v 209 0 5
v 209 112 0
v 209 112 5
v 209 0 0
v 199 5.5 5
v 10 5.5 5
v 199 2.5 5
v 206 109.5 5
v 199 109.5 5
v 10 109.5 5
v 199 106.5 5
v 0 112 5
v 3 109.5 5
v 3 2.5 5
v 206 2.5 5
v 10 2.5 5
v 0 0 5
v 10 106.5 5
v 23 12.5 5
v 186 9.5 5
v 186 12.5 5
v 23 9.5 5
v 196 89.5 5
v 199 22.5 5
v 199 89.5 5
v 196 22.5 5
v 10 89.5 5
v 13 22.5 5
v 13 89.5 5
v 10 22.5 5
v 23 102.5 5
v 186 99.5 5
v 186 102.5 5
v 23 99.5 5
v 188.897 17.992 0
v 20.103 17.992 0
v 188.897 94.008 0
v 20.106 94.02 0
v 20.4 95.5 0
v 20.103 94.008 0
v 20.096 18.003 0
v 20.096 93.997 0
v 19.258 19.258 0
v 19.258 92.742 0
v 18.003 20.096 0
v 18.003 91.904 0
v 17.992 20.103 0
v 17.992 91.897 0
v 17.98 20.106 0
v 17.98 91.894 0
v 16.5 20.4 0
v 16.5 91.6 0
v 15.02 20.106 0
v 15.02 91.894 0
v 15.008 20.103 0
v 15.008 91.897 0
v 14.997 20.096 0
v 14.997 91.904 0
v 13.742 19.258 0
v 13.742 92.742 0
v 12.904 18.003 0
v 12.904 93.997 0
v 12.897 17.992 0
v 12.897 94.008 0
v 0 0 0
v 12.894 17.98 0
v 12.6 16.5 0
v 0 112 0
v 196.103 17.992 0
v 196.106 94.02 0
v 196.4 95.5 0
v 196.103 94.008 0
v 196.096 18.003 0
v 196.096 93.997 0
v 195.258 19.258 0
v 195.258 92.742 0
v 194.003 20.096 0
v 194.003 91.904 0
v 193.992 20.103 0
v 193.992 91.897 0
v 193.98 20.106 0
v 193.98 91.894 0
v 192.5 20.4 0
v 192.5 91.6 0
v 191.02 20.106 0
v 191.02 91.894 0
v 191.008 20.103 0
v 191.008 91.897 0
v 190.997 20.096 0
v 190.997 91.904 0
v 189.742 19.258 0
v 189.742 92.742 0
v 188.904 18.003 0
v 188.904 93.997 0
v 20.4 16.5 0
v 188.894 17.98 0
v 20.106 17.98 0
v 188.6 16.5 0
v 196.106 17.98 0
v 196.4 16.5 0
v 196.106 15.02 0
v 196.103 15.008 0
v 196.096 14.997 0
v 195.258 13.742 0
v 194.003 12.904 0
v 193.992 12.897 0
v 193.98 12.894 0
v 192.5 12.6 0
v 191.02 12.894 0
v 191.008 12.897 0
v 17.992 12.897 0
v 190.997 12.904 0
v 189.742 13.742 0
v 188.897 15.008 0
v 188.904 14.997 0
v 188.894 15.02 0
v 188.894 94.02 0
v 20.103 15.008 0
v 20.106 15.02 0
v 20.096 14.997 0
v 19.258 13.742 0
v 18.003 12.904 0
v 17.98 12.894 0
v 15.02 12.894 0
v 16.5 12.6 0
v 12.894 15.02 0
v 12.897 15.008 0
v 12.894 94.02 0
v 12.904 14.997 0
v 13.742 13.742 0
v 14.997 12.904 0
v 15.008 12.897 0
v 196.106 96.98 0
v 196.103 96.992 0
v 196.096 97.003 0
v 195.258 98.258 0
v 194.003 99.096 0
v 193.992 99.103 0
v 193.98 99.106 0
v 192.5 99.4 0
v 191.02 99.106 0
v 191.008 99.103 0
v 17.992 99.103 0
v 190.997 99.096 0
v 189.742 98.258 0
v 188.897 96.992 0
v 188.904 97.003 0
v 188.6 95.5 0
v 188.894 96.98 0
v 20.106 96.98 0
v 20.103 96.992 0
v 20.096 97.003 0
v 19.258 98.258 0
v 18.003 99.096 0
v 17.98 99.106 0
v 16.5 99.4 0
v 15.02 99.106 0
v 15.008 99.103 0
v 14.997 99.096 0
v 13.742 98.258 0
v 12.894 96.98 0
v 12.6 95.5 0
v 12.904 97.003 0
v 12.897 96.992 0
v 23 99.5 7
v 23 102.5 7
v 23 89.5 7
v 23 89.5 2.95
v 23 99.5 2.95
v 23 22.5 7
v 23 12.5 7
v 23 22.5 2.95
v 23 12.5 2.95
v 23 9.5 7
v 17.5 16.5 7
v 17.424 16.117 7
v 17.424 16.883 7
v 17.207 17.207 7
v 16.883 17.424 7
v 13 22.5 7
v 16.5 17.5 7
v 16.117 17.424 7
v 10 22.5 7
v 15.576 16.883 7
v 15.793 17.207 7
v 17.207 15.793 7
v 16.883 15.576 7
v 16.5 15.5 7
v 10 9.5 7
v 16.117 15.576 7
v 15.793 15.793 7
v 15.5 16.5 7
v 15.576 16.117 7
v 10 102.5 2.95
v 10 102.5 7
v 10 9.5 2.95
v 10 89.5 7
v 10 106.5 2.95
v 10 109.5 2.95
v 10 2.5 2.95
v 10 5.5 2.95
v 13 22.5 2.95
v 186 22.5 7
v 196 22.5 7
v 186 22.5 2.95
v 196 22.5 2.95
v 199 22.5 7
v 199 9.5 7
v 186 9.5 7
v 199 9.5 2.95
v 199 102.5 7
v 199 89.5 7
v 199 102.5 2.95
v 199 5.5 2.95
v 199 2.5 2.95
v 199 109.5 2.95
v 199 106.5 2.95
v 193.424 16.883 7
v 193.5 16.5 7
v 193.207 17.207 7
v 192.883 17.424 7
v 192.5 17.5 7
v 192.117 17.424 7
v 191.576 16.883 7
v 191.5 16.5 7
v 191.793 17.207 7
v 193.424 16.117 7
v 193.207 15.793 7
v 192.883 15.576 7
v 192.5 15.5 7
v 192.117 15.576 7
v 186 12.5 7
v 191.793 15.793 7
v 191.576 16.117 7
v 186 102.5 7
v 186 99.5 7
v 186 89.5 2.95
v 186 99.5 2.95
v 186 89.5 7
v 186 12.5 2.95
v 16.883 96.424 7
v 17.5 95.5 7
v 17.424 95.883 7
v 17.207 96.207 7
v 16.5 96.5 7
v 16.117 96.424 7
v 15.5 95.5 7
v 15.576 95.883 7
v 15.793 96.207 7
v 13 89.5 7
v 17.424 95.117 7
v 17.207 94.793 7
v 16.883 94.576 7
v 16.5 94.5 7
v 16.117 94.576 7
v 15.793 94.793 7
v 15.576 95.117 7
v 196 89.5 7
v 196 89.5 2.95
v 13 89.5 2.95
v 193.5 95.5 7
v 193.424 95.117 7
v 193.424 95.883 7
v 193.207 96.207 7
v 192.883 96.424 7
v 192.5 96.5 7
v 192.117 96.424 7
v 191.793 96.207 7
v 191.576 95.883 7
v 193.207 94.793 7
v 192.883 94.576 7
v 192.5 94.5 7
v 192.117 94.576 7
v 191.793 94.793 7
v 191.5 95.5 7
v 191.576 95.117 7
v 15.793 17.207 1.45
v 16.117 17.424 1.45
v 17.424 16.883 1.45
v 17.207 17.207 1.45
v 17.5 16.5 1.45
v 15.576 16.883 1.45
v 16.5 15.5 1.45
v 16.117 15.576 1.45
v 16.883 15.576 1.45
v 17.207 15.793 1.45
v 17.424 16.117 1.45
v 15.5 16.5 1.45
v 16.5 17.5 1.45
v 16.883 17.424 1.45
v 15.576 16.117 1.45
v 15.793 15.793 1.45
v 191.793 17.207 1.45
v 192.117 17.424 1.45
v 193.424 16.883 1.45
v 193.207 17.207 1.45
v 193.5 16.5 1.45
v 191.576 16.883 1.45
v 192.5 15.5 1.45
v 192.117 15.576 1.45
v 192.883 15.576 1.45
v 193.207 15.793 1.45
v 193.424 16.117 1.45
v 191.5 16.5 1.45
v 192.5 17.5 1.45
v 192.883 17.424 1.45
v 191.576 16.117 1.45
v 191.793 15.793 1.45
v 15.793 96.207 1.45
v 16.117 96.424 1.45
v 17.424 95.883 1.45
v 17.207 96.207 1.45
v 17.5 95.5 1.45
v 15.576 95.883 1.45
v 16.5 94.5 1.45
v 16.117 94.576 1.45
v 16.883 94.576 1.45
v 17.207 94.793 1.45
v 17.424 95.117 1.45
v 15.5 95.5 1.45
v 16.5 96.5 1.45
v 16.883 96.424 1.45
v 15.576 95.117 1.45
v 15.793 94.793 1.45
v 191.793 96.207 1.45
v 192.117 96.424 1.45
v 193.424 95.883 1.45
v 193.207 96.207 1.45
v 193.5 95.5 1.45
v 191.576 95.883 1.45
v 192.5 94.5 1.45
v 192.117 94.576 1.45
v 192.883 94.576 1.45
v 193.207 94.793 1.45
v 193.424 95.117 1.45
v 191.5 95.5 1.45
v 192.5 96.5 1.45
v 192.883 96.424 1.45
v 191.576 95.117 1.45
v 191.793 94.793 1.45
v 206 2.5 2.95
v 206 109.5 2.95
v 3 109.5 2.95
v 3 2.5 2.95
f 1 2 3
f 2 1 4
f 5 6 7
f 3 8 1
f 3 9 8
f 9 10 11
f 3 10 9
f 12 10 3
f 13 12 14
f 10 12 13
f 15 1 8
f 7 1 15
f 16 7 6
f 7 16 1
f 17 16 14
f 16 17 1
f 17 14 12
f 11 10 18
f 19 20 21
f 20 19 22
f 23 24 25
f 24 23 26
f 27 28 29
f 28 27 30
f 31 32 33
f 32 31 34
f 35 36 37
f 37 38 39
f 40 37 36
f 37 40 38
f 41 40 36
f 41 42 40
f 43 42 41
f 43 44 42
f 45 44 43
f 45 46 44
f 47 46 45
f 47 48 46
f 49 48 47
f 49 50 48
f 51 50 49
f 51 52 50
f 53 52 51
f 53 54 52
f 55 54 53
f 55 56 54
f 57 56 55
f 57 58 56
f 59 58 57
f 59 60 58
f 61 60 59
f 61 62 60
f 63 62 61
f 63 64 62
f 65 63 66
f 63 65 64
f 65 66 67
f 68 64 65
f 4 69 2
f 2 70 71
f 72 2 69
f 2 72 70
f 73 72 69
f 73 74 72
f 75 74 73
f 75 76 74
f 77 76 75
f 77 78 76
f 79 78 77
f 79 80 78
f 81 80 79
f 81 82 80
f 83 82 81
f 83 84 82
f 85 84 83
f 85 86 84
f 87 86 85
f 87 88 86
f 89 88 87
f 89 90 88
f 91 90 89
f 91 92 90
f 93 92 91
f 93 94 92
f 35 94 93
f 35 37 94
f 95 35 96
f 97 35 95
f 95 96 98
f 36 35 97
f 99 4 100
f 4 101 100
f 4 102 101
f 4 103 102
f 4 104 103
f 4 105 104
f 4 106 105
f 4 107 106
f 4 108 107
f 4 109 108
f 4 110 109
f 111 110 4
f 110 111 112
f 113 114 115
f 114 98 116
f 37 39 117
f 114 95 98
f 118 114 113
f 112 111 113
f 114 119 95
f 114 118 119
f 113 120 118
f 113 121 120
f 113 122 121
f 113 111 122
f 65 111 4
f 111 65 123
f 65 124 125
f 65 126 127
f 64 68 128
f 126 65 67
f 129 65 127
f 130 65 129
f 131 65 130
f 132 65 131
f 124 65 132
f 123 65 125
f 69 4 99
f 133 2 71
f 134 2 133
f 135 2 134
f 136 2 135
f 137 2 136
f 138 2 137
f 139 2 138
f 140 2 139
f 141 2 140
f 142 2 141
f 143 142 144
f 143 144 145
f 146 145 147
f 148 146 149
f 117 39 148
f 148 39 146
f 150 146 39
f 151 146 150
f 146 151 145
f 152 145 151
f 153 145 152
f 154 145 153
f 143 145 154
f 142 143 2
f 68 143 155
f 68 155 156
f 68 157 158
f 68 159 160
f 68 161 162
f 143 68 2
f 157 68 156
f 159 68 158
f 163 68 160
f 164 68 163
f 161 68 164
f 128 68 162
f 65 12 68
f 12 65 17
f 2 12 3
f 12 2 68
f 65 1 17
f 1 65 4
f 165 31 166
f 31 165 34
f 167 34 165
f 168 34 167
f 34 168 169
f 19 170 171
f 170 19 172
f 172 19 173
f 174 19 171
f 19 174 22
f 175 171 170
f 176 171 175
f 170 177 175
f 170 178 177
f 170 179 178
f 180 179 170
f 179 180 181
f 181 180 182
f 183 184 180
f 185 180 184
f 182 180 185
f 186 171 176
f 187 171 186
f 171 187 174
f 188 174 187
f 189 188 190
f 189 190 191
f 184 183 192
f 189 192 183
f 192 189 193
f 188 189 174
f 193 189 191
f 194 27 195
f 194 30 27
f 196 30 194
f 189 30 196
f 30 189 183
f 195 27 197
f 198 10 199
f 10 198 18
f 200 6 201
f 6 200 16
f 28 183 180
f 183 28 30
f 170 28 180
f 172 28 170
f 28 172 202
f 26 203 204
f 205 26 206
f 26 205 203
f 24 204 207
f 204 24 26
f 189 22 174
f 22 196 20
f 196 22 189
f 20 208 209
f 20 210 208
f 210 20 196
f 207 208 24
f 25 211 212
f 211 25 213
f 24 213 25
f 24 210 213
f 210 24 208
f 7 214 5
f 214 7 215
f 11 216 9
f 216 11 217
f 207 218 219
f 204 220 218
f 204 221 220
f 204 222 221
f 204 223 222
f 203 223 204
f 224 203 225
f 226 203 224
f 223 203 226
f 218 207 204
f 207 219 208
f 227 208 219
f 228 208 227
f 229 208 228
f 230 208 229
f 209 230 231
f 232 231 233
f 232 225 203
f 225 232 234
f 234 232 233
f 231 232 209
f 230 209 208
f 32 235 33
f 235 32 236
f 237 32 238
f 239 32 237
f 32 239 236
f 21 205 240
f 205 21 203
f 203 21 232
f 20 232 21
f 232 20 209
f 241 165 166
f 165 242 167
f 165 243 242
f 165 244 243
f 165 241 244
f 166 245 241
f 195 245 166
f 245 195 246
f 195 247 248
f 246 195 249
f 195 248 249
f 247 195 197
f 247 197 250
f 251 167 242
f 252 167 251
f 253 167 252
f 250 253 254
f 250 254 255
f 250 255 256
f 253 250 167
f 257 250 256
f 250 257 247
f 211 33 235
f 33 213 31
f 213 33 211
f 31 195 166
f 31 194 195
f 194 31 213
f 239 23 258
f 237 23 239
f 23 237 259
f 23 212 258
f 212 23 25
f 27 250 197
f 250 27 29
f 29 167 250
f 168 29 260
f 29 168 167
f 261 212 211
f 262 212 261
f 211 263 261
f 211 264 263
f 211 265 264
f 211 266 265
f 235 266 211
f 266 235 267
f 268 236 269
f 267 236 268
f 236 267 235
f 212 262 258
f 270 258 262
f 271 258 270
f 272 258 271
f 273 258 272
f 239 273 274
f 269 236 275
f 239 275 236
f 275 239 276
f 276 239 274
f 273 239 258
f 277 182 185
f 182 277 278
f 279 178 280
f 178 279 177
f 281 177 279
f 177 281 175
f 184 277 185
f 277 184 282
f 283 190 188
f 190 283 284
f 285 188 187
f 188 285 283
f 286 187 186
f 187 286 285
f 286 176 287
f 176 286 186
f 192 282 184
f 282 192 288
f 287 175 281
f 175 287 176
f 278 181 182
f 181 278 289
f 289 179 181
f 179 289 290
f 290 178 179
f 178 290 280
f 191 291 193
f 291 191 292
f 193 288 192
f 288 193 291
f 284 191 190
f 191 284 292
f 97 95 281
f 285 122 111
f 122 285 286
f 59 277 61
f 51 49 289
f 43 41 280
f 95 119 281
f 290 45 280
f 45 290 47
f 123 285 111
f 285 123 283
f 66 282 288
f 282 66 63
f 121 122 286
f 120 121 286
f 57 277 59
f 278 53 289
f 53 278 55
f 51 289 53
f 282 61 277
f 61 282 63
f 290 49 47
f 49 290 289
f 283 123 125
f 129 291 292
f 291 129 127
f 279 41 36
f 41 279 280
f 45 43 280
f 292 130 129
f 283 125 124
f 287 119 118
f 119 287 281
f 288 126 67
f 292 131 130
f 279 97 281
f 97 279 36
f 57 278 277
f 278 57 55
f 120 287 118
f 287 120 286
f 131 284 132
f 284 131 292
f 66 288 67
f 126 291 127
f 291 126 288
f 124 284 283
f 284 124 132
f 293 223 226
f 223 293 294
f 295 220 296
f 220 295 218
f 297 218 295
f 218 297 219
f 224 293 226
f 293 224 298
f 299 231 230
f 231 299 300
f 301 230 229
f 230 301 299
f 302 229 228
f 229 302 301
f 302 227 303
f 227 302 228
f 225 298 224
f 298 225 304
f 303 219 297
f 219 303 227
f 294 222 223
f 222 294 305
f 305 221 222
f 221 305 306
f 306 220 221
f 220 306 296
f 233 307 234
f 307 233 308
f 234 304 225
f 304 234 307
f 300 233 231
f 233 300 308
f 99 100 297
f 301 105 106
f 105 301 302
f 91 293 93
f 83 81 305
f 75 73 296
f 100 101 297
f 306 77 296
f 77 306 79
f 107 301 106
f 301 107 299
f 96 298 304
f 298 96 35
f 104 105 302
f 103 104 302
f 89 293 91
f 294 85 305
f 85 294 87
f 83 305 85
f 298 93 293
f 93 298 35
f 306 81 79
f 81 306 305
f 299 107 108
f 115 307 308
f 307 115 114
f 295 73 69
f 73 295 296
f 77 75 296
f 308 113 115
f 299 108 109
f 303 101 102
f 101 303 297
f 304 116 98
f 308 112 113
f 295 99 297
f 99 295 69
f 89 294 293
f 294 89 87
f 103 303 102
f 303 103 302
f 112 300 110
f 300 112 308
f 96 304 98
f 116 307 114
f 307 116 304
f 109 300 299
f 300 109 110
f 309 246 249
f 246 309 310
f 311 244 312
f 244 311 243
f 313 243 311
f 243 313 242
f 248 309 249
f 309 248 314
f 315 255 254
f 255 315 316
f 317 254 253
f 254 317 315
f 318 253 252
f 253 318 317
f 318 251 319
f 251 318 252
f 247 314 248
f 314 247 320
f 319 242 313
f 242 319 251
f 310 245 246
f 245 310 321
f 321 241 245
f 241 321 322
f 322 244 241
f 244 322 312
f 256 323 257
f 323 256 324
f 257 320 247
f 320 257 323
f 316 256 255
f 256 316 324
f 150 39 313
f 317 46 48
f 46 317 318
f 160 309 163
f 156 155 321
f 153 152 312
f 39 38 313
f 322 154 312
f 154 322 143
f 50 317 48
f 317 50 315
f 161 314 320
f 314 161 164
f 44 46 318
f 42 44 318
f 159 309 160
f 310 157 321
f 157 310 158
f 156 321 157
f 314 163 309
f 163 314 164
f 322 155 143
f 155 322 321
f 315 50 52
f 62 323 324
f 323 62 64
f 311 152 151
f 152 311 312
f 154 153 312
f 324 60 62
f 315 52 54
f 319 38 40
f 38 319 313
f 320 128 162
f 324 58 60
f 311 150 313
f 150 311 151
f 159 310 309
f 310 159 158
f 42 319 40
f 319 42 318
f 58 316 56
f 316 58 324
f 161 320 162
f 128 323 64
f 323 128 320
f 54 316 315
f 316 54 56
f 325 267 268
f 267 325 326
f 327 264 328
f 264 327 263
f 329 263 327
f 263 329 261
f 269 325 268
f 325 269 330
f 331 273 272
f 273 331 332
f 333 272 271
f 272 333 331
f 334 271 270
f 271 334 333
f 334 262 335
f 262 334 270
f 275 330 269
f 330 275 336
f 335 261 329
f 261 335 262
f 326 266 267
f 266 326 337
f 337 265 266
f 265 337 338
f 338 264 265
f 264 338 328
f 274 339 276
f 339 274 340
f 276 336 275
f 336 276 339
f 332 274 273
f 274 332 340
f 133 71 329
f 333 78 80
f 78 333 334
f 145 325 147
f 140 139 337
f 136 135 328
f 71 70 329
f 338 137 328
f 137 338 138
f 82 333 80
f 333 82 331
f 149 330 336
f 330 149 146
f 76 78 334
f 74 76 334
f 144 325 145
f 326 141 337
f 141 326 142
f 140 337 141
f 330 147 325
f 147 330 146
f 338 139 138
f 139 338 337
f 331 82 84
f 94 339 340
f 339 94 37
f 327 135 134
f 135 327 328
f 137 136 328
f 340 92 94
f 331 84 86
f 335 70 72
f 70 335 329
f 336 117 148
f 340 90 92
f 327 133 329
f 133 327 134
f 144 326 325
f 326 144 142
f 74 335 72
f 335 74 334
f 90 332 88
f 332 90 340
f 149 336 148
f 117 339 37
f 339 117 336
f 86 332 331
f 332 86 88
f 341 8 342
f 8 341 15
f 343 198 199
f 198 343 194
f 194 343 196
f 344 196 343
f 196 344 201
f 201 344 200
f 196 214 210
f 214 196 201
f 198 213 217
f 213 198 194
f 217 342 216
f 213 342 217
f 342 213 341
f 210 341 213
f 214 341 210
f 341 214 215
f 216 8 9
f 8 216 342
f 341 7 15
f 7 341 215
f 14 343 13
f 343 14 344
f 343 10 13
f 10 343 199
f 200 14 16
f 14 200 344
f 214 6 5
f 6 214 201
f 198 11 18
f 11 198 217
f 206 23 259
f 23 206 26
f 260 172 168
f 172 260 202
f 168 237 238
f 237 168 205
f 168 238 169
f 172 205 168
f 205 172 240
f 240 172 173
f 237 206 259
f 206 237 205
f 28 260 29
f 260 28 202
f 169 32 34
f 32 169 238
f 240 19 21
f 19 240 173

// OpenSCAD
// file: Defines_v1.scad
/* spacing between the leds
 * usually around 12, can be forced
 * to 6-10 by bending strip
 */
space = 6;  

/* some space for the outermost leds
 * for better viewing angle
 */
margin = 10;

/* 15 leds (type 5050) with above spacing */
width = 15 * (5 + space) + 10 + 2 * margin;

/* box height, min. 42mm */
height = 47;

/* box depth, min 100mm for 4x3-keypad */
depth = 105;

/* max wall thickness */
thick=10;

/* grade of feet smoothness
 * below 10 looks bad
 * 10-16 is reasonable
 * above 16 takes much time to render
 */
grade = 12;

/* length of side stands 
 * should be enough to get box in right angle
 * should not exceed back of box
 */
stand = min(height + 20, depth - 40);

/* offset of usb plug from center */
usb_offs = 60;

/* calculated values */
bwidth = width + 14;
bheight = depth + 7;

/* size of led holes 
 * includes some margin for 5050 leds
 */
led = 5.75;

minimal = 1;
// main file
include <Defines_v1.scad>;

bwidth = width + 14;
bheight = depth + 7;

module hole() {
    union() {
        translate([0, 0, 3.5]) cylinder(7.1, 1, 1, $fn=16, center = true);
        translate([0, 0, 0.7]) cylinder(1.5, 4, 1, $fn=16, center = true);
    }
}

module Decke() {
    difference() {
        union() {
            translate([bwidth / 2, bheight / 2, 2.5]) 
                cube([bwidth, bheight, 5], center = true);
            translate([16.5, 16, 3.5]) 
                cube([13, 13, 7], center = true);
            translate([bwidth-16.5, 16, 3.5]) 
                cube([13, 13, 7], center = true);
            translate([16.5, bheight-16, 3.5]) 
                cube([13, 13, 7], center = true);
            translate([bwidth-16.5, bheight-16, 3.5]) 
                cube([13, 13, 7], center = true);
        }
        
        translate([bwidth - 6.5, bheight / 2, 5]) 
            cube([7, depth + 2, 4.1], center = true);

        translate([6.5, bheight / 2, 5]) 
            cube([7, depth + 2, 4.1], center = true);

        translate([bwidth / 2, 7.5, 5]) 
            cube([width, 4, 4.1], center = true);

        translate([bwidth / 2, bheight - 7.5, 5]) 
            cube([width, 4, 4.1], center = true);

        translate([bwidth / 2, bheight / 2, 5]) 
            cube([width - 12, depth - 38, 4.1], center = true);

        translate([bwidth / 2, bheight / 2, 5]) 
            cube([width - 32, depth - 18, 4.1], center = true);

        translate([16.5, 16.5, 0]) hole();
        translate([bwidth - 16.5, 16.5, 0]) hole();
        translate([16.5, bheight - 16.5, 0]) hole();
        translate([bwidth - 16.5, bheight - 16.5, 0]) hole();

        if (minimal != 1) {
            // OLED hole
            translate([71, bheight / 2 + 5 , 0])
            { 
                translate([6, 0 , 2.5]) 
                    cube([26, 11, 5.1], center = true);
                translate([7, -1 , 3]) 
                    cube([39, 13, 4.1], center = true);
            }
            
            // pin header hole
            translate([bwidth / 2 + 45, bheight - 20 , 2.5]) 
                cube([19, 3, 5.1], center = true);
            
            // loader LED thinning hole
            translate([bwidth / 2 - 30, bheight / 2 - 15, 2.5]) 
                cube([19, 8, 4], center = true);
        }
    }
}

Decke();
